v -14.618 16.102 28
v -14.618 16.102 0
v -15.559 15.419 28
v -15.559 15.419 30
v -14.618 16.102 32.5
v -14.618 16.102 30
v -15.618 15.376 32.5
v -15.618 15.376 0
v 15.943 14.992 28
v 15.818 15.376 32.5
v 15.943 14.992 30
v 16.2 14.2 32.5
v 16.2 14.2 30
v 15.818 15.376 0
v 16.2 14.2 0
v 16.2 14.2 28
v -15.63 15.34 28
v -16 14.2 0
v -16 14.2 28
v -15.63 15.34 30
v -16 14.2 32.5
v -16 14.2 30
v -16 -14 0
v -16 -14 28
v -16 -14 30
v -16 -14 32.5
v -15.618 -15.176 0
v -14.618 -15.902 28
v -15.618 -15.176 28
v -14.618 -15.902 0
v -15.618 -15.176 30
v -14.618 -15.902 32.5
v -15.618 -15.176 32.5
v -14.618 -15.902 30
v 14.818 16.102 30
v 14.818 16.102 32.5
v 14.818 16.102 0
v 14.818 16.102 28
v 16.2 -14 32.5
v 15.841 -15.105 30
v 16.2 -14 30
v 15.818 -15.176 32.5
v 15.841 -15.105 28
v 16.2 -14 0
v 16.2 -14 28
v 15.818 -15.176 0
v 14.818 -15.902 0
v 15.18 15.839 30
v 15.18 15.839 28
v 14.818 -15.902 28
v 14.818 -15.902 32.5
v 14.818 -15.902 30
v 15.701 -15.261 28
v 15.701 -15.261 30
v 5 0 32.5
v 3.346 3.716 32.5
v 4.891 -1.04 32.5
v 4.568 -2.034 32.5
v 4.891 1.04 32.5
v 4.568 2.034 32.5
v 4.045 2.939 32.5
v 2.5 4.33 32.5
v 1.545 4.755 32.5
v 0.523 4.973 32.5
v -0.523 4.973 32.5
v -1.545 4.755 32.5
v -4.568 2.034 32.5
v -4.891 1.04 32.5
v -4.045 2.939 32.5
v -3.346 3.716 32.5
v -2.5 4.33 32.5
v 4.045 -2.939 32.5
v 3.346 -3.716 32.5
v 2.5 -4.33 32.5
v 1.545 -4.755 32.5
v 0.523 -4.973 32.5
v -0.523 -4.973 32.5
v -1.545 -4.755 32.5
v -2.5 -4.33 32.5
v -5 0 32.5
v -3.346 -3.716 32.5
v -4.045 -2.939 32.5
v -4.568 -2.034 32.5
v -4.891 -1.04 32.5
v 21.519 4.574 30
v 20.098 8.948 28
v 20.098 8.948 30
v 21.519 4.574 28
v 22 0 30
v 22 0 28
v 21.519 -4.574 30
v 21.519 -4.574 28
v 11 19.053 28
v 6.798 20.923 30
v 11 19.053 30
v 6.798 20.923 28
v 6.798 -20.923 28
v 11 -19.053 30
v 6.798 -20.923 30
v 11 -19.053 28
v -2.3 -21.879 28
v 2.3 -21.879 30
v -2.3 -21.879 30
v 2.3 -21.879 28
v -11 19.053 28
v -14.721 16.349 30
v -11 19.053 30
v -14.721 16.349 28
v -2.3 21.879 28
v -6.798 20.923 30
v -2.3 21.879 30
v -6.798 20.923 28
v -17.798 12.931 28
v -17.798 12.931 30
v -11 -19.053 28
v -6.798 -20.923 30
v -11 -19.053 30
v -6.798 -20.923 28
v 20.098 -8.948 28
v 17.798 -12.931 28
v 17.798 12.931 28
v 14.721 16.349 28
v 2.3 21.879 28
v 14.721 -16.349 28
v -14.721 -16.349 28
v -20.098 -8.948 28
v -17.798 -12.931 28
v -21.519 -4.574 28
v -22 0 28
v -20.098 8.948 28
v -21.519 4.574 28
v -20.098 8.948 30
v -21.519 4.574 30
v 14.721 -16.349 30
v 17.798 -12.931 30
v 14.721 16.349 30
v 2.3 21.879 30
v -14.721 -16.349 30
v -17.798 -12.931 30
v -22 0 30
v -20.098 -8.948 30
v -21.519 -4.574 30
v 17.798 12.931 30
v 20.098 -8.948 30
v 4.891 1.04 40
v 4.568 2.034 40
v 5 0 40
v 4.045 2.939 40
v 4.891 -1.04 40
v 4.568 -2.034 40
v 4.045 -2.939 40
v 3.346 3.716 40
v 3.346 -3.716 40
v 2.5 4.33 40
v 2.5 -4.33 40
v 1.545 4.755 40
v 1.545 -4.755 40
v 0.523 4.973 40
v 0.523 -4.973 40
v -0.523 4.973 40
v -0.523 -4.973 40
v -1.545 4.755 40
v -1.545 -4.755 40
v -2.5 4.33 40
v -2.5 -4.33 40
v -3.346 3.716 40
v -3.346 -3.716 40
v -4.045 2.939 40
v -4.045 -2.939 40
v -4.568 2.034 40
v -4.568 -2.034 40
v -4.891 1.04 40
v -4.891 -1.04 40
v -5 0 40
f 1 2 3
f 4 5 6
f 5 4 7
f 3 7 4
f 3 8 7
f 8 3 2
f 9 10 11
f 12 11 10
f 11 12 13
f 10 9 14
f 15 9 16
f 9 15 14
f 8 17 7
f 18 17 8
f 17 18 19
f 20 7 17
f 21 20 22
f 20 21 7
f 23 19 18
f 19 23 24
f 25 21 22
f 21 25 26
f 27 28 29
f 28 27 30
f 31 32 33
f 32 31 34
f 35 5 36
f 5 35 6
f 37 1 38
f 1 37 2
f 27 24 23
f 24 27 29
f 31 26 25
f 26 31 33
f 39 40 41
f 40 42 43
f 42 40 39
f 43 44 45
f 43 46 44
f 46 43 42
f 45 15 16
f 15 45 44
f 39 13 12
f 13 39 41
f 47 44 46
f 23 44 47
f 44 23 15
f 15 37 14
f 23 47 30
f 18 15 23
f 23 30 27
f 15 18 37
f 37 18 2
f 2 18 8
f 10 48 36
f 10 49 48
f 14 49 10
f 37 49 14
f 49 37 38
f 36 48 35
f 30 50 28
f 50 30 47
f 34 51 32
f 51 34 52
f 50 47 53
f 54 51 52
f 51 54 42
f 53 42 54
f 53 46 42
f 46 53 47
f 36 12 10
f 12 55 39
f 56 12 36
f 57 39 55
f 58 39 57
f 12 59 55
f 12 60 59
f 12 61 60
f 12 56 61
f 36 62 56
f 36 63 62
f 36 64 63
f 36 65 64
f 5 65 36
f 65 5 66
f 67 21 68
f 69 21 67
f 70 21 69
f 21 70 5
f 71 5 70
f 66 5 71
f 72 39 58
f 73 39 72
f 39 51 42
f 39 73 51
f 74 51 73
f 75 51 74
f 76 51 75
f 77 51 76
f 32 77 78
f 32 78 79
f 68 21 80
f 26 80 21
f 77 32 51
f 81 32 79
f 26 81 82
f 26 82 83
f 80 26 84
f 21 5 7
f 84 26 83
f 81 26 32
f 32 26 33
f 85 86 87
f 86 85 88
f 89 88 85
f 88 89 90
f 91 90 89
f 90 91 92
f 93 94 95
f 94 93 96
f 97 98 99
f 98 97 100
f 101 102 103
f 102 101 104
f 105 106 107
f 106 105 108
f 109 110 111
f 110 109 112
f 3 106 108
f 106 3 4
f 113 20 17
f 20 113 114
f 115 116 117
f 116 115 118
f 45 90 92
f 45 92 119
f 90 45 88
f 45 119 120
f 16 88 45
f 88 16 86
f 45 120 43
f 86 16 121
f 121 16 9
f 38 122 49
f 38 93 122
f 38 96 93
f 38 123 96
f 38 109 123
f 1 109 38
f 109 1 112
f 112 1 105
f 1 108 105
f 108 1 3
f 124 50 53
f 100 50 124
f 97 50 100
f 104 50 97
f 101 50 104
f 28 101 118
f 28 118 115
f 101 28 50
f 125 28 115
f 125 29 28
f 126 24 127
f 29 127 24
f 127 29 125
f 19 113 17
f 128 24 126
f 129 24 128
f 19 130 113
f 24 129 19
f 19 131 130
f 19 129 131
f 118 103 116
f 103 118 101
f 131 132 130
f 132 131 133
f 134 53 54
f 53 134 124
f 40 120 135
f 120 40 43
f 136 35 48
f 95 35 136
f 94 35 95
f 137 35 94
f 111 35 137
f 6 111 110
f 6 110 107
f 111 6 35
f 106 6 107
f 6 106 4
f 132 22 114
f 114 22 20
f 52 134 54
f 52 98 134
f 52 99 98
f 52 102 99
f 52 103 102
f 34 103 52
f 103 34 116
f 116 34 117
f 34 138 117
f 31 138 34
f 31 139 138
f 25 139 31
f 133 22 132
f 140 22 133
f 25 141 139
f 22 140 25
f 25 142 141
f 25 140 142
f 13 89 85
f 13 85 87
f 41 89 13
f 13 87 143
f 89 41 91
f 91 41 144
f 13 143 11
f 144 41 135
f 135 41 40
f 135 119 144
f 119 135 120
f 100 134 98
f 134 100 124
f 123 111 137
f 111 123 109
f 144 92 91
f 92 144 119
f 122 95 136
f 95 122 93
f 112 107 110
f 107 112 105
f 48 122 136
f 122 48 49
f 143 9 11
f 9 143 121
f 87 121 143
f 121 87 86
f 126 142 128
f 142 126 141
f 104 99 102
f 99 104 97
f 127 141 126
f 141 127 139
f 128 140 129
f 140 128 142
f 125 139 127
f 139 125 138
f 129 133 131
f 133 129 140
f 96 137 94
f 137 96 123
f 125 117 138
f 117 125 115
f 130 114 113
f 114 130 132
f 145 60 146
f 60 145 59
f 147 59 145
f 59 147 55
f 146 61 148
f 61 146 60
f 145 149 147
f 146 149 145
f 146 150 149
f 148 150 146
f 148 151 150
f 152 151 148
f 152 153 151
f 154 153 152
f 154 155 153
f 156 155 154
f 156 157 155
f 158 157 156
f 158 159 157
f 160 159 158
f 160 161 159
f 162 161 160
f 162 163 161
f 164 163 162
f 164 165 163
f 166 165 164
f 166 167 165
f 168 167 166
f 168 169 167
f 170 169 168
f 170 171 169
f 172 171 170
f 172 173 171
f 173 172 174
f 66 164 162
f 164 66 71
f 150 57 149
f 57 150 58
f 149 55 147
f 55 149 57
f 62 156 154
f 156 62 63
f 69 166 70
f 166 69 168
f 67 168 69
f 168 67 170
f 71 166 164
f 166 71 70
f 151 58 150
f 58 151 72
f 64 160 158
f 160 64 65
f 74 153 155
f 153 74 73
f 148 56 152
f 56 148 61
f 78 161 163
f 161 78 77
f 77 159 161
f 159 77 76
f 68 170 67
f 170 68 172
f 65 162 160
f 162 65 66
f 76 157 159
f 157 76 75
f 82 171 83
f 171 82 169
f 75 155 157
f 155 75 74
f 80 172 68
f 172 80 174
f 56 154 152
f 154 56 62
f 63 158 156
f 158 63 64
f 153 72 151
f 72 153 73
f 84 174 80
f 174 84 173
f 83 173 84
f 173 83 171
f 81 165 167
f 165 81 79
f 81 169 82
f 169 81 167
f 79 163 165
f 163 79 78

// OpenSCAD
module nema11()
{
  
    union()
    {
        $fn=10;
minkowski()
{
        translate([-14, -14, 0])
        color("gray")cube([28.2, 28.2, 31.5]);
        cylinder(r=2,h=1);
}
        translate([0, 0, 28])
        color("yellow")cylinder (h=2, r=22, $fn=30);
        translate([0, 0, 20])
        cylinder(h=20, r=5, $fn=30);
        
    }
}
nema11();
